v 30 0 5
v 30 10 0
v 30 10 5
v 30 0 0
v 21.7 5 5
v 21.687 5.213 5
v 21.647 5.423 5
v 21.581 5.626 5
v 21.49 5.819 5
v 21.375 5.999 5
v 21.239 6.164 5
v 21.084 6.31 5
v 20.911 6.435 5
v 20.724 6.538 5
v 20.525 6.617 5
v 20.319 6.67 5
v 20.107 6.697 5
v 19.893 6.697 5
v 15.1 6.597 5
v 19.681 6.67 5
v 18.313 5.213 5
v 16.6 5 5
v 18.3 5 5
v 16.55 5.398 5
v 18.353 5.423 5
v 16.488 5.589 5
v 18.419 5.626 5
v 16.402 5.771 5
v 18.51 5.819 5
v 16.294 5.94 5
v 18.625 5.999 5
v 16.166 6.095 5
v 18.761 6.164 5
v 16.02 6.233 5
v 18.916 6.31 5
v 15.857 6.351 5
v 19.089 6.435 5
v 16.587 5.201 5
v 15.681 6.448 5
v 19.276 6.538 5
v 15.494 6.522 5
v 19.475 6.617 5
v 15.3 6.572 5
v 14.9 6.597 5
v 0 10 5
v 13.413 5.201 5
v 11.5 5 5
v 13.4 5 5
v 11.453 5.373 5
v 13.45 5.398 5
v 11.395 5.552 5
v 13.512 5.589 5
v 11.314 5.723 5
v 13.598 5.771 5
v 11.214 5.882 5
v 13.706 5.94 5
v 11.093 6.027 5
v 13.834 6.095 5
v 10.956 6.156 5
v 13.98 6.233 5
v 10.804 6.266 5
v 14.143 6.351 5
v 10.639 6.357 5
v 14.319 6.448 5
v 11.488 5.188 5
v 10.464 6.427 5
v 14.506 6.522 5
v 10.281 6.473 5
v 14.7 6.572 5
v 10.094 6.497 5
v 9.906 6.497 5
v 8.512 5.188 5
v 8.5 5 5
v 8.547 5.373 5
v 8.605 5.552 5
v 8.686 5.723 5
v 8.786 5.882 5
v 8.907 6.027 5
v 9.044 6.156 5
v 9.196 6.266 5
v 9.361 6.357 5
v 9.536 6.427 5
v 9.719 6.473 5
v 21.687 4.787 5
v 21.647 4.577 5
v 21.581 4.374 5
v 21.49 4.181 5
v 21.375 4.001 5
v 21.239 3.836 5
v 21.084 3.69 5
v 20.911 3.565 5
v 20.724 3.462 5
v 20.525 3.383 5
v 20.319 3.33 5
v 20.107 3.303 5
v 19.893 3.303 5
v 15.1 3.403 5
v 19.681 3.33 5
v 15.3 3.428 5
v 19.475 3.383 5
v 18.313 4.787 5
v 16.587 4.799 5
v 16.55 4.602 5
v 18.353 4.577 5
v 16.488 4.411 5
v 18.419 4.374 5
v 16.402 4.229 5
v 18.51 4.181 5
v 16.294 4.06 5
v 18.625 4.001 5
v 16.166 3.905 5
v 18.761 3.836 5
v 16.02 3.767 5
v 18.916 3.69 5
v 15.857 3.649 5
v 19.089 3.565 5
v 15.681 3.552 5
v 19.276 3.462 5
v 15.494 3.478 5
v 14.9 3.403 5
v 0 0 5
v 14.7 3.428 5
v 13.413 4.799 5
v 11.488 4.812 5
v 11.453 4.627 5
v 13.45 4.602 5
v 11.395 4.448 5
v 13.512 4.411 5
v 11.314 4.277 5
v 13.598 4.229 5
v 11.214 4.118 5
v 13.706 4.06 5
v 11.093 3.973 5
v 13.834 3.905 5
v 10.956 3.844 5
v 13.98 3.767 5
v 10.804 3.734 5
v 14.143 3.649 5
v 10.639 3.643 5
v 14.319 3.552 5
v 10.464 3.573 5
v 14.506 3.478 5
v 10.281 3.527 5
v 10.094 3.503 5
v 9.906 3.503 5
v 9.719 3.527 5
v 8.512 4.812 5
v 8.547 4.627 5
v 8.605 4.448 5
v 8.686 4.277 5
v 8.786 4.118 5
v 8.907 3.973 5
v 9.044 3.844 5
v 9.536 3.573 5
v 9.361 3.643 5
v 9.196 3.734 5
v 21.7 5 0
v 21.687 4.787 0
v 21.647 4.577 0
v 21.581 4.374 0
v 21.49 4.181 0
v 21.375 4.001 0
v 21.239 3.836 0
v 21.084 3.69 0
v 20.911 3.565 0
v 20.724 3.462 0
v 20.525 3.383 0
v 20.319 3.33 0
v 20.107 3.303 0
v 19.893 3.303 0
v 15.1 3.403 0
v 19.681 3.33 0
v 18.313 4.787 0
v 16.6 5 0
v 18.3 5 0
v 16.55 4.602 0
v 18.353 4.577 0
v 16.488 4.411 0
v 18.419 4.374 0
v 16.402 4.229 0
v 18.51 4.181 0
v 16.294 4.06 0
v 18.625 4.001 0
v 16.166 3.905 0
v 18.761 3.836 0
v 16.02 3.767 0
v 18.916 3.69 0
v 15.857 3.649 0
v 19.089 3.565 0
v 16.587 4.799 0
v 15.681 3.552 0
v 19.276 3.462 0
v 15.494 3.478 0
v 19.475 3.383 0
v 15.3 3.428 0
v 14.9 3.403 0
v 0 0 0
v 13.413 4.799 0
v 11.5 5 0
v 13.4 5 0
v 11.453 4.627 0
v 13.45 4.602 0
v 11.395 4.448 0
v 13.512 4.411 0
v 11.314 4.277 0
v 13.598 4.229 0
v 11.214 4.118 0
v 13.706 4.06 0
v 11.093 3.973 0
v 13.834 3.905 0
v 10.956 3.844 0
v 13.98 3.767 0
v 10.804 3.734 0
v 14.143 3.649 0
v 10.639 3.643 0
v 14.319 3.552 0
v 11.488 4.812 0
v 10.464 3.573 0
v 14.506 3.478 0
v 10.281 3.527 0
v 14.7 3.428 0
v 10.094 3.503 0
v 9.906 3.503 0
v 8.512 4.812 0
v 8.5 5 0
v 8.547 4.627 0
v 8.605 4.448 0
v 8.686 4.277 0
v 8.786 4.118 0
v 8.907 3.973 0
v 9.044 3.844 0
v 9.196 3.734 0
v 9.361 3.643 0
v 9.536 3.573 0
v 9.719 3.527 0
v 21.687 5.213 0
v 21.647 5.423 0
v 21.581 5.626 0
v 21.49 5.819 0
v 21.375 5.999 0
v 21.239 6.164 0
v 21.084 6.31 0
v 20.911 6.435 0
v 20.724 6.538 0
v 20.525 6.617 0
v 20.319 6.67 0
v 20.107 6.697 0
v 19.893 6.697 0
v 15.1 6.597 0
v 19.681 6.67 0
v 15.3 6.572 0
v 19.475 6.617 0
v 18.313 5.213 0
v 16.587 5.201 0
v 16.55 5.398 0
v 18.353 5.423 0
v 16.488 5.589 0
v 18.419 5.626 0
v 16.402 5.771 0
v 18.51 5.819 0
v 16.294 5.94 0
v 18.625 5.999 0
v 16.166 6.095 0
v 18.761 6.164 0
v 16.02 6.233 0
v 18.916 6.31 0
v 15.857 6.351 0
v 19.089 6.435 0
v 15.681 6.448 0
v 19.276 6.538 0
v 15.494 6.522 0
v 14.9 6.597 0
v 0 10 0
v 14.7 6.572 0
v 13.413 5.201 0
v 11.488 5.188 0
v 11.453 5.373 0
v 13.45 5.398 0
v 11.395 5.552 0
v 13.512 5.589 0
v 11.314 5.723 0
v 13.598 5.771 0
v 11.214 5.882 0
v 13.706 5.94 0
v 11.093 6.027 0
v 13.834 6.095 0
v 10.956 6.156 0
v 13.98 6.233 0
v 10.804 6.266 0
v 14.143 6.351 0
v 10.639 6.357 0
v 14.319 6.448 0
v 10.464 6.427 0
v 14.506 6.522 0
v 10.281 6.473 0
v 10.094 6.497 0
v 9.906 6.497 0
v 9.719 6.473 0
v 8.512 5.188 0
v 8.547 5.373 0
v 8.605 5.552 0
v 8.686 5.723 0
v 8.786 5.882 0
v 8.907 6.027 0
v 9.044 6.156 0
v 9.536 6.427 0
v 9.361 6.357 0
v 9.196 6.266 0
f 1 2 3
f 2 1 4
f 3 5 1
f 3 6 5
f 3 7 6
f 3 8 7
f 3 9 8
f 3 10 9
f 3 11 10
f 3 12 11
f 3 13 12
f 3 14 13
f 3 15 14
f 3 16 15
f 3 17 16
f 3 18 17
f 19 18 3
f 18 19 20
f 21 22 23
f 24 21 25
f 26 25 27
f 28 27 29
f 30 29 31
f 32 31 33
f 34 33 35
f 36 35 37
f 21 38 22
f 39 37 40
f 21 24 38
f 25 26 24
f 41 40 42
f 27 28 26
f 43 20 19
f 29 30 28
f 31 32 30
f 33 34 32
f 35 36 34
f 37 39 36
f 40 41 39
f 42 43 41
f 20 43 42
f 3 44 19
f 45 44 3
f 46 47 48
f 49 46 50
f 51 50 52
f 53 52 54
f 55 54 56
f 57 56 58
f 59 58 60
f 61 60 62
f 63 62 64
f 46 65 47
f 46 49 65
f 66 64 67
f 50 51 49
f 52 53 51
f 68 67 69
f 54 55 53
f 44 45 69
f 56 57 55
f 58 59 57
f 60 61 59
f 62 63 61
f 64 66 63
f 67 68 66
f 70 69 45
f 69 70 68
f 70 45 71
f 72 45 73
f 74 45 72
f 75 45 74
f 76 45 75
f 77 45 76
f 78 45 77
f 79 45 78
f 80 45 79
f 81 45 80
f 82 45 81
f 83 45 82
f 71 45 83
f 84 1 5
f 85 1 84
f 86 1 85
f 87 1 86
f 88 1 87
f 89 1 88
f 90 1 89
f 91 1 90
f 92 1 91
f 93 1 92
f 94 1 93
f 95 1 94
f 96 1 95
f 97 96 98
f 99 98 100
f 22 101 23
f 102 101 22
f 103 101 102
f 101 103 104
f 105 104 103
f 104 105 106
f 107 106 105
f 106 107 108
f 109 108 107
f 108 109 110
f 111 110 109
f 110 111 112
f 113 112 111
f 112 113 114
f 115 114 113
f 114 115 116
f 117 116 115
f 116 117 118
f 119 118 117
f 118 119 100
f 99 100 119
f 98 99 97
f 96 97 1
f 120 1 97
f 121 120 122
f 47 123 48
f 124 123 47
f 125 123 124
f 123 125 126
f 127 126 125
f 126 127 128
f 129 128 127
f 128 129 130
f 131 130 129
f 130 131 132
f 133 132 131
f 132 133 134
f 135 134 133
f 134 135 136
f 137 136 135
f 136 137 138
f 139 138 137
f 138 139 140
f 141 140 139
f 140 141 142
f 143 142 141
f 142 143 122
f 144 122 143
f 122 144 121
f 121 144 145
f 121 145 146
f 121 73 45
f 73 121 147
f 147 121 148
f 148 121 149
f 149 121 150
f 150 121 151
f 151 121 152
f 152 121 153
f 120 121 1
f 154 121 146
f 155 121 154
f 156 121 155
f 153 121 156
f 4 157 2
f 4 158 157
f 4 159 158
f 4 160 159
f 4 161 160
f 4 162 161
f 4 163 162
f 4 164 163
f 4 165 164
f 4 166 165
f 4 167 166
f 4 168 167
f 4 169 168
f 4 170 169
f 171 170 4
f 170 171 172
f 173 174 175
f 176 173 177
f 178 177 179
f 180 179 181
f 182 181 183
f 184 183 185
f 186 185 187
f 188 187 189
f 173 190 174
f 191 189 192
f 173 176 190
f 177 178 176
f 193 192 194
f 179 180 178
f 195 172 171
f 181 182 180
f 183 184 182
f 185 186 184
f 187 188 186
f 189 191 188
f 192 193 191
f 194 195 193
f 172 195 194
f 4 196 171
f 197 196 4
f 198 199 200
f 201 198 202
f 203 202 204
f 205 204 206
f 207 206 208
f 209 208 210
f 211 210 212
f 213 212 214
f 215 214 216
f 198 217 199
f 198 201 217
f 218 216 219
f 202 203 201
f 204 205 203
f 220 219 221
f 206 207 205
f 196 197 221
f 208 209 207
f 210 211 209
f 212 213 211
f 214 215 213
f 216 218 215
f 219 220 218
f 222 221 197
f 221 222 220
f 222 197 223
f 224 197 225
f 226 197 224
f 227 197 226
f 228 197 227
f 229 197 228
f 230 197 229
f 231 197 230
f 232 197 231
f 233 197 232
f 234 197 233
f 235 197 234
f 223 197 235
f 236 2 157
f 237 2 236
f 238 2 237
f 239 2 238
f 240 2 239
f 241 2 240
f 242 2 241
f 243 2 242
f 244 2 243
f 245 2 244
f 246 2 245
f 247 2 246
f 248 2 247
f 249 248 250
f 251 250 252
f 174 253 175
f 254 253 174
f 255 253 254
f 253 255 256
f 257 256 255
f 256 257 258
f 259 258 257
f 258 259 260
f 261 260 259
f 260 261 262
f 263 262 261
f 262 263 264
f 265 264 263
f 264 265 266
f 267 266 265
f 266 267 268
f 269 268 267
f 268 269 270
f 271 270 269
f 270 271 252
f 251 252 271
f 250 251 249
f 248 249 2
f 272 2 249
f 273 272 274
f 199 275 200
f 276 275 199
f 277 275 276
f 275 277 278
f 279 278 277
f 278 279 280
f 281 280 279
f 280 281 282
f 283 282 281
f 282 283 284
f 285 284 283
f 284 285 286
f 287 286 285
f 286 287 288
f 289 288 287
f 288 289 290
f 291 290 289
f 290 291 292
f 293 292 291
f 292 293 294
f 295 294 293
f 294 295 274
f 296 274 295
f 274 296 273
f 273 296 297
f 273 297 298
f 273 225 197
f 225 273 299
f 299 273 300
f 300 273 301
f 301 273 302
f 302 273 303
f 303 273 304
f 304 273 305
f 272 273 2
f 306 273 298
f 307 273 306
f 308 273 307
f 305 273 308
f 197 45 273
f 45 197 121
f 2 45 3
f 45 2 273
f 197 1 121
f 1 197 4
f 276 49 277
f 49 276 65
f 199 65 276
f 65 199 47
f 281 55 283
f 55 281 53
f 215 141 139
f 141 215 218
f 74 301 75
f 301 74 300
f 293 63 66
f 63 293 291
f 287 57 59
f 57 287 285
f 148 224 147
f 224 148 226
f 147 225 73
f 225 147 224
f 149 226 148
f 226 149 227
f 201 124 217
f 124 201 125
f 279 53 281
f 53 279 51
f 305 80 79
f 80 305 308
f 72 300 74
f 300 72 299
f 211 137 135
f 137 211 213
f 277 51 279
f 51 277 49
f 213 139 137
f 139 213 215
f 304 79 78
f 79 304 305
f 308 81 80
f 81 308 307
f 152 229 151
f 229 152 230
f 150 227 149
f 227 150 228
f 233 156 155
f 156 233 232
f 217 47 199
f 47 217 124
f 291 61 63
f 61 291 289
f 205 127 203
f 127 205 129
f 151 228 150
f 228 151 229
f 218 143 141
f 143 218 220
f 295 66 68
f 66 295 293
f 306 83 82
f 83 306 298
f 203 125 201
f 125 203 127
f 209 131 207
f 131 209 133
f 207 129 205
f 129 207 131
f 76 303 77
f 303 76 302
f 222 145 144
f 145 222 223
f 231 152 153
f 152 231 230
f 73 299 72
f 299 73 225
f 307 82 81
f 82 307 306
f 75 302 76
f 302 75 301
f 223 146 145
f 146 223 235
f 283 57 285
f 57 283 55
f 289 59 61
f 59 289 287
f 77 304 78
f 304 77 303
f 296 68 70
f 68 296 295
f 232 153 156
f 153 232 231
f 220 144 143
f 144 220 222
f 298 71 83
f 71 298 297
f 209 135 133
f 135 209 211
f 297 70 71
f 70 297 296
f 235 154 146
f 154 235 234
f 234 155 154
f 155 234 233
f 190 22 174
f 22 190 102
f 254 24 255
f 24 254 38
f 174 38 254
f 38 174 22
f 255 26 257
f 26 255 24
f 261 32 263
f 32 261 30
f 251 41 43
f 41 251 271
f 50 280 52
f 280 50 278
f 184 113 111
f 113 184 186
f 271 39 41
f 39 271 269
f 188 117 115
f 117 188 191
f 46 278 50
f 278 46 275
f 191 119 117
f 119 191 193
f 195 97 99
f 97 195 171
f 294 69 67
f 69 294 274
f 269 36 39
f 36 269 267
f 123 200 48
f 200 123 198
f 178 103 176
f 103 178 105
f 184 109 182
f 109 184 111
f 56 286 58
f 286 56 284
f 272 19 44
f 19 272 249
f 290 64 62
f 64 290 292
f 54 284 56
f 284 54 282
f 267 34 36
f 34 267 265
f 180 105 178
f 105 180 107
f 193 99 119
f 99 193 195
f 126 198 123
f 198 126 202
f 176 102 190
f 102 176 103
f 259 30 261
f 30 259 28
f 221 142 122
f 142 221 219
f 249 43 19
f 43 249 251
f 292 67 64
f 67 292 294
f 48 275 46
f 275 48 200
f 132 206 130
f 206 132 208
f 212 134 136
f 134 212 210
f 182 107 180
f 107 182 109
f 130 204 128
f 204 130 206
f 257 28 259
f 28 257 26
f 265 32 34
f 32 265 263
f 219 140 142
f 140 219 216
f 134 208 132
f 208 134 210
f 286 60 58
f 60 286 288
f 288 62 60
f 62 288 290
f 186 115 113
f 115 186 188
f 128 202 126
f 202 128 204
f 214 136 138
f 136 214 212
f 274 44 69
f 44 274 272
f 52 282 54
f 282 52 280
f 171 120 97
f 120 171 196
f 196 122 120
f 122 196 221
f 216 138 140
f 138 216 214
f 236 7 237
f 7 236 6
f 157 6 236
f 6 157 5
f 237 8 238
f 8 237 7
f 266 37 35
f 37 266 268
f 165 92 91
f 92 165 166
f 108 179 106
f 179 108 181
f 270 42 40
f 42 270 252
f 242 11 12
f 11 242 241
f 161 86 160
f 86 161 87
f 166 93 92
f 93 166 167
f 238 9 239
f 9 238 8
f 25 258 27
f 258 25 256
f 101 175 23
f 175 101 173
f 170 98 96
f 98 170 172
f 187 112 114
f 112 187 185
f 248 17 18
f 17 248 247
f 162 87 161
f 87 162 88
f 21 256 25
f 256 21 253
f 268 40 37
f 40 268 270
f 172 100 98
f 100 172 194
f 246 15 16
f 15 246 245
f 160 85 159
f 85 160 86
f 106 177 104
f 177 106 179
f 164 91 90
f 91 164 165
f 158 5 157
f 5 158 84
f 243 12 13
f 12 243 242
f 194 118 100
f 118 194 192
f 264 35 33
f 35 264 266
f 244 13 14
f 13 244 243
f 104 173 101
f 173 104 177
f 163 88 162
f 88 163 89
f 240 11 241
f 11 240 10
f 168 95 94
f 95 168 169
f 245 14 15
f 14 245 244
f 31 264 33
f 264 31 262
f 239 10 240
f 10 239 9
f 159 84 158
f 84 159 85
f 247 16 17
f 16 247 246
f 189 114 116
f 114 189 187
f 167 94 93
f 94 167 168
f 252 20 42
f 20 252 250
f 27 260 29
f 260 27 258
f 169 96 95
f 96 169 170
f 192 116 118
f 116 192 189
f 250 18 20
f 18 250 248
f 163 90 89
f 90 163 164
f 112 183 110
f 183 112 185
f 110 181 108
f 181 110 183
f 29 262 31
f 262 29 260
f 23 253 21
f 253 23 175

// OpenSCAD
difference() {
	cube( [30,10,5] );
	translate([10,5,-2]) cylinder( r=1.5, h=20, $fn=50 );
	translate([15,5,-2]) cylinder( r=1.6, h=20, $fn=50 );
		// 1.6 Is the right radius for an attachment to the stepper motor
	translate([20,5,-2]) cylinder( r=1.7, h=20, $fn=50 );
}
